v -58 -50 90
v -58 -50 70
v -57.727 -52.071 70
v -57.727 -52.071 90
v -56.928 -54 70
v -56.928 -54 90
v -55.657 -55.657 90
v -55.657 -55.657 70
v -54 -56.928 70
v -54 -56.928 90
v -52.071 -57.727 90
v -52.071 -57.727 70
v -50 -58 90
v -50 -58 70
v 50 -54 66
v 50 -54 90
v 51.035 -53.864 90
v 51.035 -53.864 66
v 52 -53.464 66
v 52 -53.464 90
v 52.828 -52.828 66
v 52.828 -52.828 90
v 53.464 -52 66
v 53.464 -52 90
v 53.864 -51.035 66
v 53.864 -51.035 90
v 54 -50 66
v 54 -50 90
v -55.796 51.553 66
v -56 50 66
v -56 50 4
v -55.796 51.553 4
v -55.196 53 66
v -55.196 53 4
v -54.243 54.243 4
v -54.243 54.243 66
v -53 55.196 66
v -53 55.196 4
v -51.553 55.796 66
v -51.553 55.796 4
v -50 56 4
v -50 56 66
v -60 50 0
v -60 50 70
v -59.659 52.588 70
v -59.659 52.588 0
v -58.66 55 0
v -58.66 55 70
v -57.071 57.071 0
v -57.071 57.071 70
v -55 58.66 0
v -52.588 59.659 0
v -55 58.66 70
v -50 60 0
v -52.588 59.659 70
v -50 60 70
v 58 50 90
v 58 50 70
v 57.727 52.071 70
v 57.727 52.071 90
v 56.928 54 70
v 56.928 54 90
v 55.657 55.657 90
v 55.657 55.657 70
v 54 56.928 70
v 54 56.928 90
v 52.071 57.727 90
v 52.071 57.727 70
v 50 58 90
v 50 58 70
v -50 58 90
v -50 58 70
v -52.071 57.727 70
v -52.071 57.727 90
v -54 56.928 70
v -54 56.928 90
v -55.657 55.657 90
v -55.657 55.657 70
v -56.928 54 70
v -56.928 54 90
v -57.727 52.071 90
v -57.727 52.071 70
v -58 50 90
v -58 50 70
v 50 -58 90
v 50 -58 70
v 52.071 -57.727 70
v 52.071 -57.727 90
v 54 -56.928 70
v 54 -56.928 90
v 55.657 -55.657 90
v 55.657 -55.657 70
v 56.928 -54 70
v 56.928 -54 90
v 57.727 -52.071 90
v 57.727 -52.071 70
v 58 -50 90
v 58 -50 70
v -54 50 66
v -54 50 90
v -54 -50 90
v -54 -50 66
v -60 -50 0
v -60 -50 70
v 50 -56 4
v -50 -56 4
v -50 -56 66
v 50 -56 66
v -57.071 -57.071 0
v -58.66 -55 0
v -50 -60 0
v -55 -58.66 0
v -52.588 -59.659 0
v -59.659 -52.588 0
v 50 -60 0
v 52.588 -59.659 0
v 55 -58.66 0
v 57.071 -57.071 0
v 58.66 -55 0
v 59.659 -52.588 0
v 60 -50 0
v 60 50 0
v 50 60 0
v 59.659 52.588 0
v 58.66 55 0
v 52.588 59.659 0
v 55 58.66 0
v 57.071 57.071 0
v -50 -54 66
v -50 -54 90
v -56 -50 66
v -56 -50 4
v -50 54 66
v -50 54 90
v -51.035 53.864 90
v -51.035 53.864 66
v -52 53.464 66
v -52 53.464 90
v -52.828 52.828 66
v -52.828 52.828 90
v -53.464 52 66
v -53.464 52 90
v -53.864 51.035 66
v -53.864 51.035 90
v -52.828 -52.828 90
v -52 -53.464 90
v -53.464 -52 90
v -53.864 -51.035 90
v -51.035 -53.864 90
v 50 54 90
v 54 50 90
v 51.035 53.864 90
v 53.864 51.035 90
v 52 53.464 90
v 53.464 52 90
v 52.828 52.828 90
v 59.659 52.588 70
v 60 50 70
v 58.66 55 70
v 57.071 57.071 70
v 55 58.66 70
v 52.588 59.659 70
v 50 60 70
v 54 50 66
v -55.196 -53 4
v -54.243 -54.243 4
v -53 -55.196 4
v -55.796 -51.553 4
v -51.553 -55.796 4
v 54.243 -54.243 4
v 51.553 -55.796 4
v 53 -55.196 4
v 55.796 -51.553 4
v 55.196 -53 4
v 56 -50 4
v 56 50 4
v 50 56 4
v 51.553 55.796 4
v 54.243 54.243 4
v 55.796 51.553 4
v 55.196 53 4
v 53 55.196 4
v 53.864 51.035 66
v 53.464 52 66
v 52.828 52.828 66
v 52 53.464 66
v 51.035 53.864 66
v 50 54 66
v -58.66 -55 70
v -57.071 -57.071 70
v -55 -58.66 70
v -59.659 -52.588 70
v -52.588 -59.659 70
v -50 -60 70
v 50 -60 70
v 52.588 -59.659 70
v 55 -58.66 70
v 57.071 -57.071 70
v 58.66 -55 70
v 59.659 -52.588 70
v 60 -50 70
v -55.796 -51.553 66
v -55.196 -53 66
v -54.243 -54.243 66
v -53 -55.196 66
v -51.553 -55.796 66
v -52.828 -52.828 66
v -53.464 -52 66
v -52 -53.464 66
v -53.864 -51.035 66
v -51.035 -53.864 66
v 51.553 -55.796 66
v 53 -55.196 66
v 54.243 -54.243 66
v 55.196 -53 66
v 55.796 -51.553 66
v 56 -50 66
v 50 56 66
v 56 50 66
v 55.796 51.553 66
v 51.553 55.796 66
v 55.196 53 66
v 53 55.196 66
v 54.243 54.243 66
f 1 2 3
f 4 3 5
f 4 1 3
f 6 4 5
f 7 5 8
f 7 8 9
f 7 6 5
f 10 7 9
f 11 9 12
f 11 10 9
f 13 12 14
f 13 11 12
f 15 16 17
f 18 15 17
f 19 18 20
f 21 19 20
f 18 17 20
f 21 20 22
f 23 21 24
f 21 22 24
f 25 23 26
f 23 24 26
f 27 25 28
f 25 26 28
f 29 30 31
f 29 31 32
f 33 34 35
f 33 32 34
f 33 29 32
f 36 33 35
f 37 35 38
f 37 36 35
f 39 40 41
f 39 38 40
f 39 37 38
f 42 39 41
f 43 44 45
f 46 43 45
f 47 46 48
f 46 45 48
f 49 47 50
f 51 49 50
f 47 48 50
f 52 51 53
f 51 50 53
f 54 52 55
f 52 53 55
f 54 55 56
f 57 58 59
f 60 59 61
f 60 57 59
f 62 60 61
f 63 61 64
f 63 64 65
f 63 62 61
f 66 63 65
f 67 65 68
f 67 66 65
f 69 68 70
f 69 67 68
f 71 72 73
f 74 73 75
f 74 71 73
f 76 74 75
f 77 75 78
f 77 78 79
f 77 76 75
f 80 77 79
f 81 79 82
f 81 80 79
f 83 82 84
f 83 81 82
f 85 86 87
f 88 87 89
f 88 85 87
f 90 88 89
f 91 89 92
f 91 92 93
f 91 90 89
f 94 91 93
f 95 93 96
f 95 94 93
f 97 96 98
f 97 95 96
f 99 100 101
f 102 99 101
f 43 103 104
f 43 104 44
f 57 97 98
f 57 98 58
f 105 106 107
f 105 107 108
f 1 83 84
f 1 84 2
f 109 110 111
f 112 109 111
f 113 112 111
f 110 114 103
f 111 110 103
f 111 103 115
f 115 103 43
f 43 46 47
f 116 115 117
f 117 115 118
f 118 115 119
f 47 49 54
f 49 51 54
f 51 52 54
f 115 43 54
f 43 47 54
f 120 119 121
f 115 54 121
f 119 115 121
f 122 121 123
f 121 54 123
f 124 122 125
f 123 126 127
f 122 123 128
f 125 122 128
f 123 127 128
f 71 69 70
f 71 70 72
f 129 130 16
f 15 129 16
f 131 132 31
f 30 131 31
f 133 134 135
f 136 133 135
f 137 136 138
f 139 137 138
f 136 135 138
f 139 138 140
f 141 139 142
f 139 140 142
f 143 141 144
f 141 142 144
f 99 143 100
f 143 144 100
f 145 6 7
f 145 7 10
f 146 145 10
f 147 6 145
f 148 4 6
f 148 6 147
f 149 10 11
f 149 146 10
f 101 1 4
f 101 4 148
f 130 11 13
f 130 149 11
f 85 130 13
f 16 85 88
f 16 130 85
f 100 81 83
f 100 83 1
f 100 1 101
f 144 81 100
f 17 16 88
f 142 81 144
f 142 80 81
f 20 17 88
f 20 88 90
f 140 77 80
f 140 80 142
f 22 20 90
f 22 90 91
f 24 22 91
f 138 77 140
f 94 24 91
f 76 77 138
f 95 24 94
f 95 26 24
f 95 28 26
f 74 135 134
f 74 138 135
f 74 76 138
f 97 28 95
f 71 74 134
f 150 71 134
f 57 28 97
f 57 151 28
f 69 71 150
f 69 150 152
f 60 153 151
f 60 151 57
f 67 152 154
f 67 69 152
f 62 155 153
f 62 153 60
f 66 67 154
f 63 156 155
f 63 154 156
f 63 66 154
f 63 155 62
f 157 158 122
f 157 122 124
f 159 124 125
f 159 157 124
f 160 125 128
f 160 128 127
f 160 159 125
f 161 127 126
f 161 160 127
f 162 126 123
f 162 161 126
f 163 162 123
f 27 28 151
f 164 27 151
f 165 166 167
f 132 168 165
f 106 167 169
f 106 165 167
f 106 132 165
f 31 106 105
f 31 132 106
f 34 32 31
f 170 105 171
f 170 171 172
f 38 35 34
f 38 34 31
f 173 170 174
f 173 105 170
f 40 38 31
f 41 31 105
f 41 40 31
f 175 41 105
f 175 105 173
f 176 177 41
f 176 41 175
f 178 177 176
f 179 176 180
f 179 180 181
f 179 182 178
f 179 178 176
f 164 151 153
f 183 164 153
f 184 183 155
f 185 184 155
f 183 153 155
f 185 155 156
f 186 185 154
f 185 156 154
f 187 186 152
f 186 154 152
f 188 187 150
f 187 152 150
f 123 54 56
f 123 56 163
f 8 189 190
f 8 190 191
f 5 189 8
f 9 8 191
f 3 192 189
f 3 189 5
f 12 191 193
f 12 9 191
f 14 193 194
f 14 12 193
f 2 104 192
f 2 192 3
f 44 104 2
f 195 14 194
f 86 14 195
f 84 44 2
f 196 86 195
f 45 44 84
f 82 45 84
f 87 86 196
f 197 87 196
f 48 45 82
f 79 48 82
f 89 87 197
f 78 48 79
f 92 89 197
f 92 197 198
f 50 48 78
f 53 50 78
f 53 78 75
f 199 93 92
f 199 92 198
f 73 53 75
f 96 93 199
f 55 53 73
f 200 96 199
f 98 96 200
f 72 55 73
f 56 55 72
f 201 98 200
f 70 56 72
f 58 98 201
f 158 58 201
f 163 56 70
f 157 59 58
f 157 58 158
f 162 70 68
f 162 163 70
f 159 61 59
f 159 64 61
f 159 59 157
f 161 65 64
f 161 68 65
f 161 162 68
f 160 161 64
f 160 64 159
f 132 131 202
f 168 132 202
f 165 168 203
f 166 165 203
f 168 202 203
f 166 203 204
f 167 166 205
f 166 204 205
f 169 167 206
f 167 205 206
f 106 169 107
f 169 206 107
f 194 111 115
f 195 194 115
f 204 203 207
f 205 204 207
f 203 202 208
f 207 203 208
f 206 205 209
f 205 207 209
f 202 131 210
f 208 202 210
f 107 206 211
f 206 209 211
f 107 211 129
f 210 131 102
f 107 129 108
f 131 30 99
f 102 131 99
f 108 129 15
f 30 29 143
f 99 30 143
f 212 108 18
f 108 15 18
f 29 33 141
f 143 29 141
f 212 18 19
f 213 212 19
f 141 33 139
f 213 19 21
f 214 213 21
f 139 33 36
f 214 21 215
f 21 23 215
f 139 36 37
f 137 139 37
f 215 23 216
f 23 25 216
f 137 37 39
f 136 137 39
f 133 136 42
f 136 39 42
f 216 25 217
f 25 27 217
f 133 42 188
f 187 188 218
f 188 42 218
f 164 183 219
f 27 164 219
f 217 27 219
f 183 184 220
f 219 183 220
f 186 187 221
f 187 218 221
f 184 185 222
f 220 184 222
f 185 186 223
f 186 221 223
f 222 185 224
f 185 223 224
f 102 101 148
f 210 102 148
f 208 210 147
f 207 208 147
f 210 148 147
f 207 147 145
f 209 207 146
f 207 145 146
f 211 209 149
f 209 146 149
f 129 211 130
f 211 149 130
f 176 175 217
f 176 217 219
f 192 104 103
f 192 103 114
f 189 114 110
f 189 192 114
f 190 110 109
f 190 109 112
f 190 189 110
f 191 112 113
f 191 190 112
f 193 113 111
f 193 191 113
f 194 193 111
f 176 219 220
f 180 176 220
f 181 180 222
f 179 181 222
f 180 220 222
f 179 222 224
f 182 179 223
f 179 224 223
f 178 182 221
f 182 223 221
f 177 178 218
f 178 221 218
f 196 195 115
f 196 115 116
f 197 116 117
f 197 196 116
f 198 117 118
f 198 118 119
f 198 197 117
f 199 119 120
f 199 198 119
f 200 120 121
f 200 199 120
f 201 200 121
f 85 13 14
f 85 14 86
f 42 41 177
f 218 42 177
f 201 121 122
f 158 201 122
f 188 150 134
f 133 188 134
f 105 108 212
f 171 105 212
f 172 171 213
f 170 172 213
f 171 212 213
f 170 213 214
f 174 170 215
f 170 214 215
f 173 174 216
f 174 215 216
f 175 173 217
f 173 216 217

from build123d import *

# Parameters (mm, degrees)
SKETCH1_W           = 120
SKETCH1_H           = 120
BOSS_EXTRUDE1_DEPTH = 90
FILLET1_R           = 10
CUT_EXTRUDE4_DEPTH  = 20
SHELL1_T            = -4


with BuildPart() as part:
    # Sketch1 → Boss-Extrude1 (new body)
    with BuildSketch(Plane.XY):
        Rectangle(SKETCH1_W, SKETCH1_H)
    extrude(amount=BOSS_EXTRUDE1_DEPTH)

    # Fillet1
    fillet1_edges = [part.edges().sort_by_distance(p)[0] for p in [
        (60, -60, 45),
        (-60, -60, 45),
        (-60, 60, 45),
        (60, 60, 45),
    ]]
    fillet(fillet1_edges, radius=FILLET1_R)

    # Sketch4 → Cut-Extrude4 (cut)
    with BuildSketch(Plane.XY.offset(90)):
        with BuildLine():
            Line((-60, 50), (-60, -50))
            ThreePointArc((-60, -50), (-57.071067812, -57.071067812), (-50, -60))
            Line((-50, -60), (50, -60))
            ThreePointArc((50, -60), (57.071067812, -57.071067812), (60, -50))
            Line((60, -50), (60, 50))
            ThreePointArc((60, 50), (57.071067812, 57.071067812), (50, 60))
            Line((50, 60), (-50, 60))
            ThreePointArc((-50, 60), (-57.071067812, 57.071067812), (-60, 50))
        make_face()
        with BuildLine():
            Line((-58, 50), (-58, -50))
            ThreePointArc((-58, -50), (-55.656854249, -55.656854249), (-50, -58))
            Line((-50, -58), (50, -58))
            ThreePointArc((50, -58), (55.656854249, -55.656854249), (58, -50))
            Line((58, -50), (58, 50))
            ThreePointArc((58, 50), (55.656854249, 55.656854249), (50, 58))
            Line((50, 58), (-50, 58))
            ThreePointArc((-50, 58), (-55.656854249, 55.656854249), (-58, 50))
        make_face(mode=Mode.SUBTRACT)
    extrude(amount=-CUT_EXTRUDE4_DEPTH, mode=Mode.SUBTRACT)

    # Shell1
    shell1_openings = [part.faces().sort_by_distance(p)[0] for p in [
        (0, 0, 90),
    ]]
    offset(amount=SHELL1_T, openings=shell1_openings, kind=Kind.INTERSECTION)


solid = part.part
